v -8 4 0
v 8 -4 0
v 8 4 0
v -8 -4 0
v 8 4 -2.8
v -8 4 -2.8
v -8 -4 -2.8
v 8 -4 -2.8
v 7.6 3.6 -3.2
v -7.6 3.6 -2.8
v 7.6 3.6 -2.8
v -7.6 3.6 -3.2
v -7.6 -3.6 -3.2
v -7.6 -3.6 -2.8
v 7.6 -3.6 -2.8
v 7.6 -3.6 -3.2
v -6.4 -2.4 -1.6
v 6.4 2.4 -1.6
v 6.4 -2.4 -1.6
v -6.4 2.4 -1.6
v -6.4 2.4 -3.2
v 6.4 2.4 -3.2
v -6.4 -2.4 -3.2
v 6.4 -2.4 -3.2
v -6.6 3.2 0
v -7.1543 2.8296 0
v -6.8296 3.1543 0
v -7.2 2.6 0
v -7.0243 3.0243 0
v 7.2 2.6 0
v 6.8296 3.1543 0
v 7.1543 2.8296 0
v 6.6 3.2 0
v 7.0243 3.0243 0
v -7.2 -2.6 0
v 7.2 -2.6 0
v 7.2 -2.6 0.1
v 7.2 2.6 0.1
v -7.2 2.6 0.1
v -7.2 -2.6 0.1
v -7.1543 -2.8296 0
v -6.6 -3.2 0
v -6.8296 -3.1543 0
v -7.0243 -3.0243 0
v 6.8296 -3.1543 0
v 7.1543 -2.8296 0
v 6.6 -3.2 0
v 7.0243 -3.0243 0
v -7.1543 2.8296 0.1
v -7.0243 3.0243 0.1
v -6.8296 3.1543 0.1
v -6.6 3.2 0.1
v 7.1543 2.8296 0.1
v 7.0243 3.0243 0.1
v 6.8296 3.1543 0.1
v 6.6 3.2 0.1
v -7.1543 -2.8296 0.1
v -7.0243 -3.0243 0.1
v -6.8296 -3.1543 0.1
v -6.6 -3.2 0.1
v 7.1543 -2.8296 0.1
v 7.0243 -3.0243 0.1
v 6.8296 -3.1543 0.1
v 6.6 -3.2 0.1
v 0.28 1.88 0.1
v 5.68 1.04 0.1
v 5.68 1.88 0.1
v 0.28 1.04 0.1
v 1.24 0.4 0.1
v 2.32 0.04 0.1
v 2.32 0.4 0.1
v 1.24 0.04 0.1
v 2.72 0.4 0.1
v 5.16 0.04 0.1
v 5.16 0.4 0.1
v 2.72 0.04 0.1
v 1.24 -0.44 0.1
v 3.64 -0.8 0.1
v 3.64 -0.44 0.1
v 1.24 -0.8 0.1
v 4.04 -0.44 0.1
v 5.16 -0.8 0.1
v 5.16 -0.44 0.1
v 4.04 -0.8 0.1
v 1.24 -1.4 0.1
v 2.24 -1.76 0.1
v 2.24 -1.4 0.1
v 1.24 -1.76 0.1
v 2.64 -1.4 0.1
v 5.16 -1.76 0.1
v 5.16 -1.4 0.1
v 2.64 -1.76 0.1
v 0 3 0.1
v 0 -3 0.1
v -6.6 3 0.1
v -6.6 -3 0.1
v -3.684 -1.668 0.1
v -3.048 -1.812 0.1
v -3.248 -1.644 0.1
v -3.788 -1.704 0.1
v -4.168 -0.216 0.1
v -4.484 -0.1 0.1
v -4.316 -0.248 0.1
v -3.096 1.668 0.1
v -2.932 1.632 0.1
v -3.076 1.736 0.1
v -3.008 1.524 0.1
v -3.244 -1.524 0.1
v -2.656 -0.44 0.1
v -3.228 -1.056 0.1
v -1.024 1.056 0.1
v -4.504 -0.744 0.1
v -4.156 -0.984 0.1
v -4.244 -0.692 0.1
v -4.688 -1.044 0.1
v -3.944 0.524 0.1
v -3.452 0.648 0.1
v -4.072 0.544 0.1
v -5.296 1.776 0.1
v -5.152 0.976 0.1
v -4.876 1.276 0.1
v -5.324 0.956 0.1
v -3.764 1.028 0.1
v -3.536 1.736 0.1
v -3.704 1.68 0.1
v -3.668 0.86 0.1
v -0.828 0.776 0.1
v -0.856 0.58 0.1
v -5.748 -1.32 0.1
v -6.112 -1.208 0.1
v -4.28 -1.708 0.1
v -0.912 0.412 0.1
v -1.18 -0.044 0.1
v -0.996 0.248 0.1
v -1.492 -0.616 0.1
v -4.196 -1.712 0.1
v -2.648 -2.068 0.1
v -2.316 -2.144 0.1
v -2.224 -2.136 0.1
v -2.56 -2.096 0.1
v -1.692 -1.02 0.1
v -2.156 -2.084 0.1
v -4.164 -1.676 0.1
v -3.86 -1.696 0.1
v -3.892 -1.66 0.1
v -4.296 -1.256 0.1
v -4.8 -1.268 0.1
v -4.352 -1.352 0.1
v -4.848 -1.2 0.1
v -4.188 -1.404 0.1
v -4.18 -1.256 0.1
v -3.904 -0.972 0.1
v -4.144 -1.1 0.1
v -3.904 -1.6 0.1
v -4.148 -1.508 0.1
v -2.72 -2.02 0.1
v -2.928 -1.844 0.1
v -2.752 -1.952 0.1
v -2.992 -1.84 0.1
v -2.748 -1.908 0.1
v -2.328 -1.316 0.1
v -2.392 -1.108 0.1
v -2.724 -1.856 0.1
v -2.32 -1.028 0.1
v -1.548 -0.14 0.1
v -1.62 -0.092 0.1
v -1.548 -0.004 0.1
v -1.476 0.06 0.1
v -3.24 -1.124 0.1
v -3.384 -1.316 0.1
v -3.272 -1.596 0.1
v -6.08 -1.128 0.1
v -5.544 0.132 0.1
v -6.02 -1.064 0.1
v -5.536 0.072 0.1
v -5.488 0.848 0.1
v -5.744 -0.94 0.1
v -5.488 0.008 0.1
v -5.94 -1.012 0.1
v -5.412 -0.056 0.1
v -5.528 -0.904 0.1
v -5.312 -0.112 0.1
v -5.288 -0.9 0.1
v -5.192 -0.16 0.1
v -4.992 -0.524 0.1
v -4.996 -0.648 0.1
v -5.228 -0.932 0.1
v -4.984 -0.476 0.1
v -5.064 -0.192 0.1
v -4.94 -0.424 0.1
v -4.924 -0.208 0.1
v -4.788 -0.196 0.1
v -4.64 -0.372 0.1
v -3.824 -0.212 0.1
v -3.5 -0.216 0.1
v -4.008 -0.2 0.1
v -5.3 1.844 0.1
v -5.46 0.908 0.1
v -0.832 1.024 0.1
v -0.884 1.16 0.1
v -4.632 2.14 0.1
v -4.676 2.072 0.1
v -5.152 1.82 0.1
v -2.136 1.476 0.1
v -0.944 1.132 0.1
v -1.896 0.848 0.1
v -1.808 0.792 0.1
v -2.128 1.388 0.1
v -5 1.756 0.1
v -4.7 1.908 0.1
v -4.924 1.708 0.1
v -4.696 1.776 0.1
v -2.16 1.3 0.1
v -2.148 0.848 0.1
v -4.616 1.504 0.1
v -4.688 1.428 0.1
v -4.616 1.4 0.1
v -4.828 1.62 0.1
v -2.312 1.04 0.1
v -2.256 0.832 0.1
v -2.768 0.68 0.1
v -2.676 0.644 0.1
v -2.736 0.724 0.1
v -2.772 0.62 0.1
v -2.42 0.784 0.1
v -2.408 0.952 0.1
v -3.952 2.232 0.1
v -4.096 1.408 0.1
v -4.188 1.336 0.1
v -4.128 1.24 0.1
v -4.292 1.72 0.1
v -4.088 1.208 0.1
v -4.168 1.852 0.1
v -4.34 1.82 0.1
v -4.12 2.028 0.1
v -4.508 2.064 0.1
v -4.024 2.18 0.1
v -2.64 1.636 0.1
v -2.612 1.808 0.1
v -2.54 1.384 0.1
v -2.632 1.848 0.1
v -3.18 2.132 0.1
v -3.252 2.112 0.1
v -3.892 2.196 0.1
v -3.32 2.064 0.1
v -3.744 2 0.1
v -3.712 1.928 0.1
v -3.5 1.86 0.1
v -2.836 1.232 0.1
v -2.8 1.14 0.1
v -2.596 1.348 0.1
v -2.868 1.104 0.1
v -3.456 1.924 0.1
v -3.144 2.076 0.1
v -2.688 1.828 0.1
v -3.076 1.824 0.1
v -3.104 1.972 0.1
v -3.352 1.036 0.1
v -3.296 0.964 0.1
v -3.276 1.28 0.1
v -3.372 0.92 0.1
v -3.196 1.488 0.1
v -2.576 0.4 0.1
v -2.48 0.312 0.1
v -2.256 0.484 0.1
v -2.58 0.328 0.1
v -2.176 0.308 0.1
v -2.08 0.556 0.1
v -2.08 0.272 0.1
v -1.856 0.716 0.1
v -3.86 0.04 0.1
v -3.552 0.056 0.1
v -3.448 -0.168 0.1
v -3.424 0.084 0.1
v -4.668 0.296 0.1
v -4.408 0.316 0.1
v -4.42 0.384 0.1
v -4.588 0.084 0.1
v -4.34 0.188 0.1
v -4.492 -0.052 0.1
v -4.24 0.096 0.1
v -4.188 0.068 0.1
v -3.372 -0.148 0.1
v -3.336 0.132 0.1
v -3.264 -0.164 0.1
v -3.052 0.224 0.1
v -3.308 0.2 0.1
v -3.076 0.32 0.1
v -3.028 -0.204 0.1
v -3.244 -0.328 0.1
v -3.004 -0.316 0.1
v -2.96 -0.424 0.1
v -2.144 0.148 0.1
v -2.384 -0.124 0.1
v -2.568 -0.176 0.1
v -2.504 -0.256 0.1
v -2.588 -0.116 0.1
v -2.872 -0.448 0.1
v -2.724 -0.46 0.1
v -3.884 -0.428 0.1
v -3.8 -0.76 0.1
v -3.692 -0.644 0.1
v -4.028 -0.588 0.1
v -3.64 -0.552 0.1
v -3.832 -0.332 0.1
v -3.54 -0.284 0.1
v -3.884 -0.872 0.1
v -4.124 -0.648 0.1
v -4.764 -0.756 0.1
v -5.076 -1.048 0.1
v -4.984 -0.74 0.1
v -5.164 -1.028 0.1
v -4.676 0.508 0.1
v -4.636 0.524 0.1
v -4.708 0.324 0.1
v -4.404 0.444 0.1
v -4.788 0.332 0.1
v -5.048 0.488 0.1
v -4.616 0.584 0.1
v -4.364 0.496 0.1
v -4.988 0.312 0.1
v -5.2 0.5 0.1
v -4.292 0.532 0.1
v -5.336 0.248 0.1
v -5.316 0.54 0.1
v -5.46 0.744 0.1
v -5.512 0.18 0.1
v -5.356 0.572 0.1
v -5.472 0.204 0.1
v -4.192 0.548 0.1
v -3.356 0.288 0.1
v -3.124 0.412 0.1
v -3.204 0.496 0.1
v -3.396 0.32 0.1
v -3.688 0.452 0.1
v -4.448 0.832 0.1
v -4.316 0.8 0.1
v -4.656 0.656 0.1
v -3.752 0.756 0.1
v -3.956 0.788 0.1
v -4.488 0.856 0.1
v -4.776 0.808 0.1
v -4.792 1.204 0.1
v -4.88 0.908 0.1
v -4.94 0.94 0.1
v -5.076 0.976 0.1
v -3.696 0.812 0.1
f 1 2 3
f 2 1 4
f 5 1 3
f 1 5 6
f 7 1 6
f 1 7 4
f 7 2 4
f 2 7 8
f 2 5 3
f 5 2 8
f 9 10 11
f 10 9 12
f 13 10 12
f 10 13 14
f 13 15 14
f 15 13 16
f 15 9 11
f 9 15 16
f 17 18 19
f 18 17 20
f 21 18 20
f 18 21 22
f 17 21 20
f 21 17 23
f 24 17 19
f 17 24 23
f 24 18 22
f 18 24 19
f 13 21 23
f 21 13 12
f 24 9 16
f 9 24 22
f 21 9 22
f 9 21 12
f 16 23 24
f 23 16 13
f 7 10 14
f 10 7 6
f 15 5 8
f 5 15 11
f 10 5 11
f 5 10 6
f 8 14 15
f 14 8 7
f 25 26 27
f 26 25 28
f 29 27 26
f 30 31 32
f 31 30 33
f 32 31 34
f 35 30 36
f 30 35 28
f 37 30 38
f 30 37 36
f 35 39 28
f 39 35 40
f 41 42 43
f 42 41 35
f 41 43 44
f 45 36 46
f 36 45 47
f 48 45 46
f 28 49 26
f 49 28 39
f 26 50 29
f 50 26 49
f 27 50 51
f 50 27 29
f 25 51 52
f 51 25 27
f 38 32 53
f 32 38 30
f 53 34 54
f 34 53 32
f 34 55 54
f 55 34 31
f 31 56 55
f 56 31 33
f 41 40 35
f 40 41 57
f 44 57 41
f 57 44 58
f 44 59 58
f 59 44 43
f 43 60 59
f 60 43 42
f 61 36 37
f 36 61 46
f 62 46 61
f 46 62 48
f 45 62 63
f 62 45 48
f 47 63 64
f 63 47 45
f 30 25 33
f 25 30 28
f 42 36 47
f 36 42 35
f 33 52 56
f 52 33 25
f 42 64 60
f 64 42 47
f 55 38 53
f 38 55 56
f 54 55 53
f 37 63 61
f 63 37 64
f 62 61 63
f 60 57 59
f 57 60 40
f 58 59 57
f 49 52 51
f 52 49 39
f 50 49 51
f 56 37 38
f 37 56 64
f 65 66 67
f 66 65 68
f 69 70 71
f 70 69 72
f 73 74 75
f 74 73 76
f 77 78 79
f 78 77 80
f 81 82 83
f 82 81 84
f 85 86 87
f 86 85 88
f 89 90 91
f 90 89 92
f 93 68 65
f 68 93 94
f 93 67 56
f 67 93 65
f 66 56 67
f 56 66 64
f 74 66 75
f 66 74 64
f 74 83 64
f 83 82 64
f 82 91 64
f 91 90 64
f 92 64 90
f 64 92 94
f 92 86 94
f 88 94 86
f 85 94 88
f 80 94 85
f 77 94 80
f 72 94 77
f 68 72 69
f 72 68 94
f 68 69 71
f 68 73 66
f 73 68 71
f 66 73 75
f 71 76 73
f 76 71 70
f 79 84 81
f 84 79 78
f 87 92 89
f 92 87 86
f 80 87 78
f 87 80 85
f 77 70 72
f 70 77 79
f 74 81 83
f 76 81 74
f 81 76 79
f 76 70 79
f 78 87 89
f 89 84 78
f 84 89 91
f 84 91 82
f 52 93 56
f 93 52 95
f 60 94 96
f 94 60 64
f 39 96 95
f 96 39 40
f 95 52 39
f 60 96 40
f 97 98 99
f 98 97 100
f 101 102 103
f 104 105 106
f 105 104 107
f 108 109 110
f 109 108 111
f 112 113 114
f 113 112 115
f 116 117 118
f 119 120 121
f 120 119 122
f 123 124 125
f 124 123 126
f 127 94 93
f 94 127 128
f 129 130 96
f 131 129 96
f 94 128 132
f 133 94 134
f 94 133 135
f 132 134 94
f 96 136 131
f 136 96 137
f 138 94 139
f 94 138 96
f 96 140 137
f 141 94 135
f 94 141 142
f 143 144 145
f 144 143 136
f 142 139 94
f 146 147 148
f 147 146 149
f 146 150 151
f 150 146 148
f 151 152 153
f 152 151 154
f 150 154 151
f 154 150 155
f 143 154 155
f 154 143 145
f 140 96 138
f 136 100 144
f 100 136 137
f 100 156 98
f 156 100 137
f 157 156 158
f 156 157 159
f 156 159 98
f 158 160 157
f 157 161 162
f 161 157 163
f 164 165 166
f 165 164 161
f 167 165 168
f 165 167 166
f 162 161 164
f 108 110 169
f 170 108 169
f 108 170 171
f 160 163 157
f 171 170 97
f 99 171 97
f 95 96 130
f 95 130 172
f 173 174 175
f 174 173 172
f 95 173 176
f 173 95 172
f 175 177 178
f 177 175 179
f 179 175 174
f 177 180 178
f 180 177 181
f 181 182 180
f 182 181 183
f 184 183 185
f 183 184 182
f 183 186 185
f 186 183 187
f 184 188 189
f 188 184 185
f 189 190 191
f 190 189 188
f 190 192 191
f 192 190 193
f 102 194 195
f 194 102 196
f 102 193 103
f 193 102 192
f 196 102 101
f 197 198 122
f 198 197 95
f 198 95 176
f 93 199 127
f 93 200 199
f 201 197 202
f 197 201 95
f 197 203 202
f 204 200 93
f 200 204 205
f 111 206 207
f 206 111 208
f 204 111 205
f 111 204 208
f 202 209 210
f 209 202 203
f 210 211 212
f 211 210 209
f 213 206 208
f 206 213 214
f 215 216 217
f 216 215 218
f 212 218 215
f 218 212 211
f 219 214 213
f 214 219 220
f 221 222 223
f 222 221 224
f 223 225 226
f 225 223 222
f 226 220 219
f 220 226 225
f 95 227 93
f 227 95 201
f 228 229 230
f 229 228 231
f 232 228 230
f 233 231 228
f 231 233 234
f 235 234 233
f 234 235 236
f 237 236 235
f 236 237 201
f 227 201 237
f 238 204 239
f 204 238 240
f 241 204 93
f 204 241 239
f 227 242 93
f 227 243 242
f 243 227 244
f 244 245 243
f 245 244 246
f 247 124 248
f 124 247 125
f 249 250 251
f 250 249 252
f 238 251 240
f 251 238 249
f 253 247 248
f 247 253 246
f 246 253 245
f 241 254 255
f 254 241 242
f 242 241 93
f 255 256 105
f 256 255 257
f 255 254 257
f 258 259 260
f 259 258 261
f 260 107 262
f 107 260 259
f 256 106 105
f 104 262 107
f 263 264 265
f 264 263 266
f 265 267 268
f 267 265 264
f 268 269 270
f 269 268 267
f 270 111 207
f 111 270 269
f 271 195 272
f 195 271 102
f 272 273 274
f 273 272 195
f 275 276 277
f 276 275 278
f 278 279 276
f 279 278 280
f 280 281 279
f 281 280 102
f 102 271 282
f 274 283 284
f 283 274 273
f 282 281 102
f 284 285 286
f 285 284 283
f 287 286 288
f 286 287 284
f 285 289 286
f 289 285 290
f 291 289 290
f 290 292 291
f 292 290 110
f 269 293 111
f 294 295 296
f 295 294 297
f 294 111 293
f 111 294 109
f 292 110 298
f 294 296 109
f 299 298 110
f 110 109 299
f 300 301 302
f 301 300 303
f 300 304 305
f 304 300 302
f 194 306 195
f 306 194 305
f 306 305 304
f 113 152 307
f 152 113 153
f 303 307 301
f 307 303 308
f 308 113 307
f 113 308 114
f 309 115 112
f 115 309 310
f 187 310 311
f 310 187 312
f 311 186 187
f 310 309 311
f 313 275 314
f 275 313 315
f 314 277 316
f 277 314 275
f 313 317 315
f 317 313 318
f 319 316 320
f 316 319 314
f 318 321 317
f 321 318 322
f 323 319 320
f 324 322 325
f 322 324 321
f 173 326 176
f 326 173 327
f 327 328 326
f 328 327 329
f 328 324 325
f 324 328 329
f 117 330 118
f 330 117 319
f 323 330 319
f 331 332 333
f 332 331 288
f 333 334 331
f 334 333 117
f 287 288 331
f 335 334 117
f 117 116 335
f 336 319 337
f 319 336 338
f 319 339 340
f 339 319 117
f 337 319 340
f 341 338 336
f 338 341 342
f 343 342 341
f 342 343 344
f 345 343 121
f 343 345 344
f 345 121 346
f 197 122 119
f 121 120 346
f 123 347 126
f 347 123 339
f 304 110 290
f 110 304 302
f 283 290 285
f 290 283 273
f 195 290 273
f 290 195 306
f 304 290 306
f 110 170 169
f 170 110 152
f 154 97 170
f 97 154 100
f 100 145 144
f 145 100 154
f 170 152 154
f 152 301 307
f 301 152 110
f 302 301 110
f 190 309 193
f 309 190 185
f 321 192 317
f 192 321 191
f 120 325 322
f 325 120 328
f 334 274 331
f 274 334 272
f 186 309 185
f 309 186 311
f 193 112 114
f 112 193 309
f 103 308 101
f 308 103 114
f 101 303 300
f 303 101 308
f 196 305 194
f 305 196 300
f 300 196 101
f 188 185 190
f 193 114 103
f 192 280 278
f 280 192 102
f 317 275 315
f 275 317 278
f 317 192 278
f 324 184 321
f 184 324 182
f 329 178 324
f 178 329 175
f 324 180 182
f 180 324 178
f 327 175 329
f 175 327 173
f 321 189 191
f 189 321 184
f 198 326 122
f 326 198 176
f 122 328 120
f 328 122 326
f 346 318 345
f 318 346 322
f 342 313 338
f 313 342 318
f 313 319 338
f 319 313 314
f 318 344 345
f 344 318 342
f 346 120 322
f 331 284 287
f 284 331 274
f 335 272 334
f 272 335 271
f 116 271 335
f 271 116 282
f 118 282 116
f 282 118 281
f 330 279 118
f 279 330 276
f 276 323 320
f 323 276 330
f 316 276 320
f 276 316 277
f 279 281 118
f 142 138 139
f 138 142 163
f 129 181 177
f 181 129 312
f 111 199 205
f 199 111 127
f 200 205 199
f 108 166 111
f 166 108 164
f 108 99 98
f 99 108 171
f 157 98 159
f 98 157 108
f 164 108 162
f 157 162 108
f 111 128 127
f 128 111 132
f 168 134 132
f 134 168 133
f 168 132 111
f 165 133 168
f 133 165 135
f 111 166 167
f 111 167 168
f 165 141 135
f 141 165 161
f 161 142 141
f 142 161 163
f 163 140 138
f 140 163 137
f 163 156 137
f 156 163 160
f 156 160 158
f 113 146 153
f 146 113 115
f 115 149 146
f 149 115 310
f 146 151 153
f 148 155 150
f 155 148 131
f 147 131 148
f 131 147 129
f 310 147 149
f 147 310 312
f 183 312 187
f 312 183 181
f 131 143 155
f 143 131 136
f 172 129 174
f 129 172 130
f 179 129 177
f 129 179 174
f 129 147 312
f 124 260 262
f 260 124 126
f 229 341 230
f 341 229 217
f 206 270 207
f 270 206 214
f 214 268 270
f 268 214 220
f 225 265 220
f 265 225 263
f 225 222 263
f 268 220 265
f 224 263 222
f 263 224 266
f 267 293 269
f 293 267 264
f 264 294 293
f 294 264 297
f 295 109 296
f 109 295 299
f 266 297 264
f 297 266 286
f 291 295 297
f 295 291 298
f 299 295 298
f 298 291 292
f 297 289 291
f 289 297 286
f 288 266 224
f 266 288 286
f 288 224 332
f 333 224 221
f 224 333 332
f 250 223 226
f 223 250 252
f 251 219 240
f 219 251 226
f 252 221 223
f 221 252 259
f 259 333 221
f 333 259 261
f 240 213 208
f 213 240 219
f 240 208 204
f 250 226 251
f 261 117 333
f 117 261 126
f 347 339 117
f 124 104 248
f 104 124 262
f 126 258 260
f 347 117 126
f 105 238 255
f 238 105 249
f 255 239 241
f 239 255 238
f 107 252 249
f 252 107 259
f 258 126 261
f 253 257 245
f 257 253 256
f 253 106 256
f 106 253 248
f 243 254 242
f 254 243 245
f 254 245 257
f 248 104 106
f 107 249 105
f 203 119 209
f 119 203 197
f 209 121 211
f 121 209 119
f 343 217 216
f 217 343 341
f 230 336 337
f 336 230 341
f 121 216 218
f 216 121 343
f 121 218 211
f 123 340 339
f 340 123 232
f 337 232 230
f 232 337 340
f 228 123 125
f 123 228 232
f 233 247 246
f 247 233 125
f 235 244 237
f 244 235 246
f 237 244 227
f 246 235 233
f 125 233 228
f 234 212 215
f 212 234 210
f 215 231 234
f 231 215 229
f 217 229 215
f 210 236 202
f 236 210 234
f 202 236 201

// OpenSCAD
use <../lib.scad>
use <3069b.scad>
use <6435269d.scad>
function ldraw_lib__3069bd1b() = [
// 0 Tile  1 x  2 with Strelitzia Reginae Sign Sticker
// 0 Name: 3069bd1b.dat
// 0 Author: Philippe Hurbain [Philo]
// 0 !LDRAW_ORG Shortcut UPDATE 2025-08
// 0 !LICENSE Licensed under CC BY 4.0 : see CAreadme.txt
// 
// 0 BFC CERTIFY CCW
  [0,"BFC","CERTIFY"],
  [0,"BFC","CCW"],
// 
// 0 !CATEGORY Sticker Shortcut
// 0 !KEYWORDS Bricklink 41757stk01, Rebrickable 10109627, Set 41757
// 
// 0 !HISTORY 2025-08-31 [OrionP] Official Update 2025-08
// 
// 1 16 0 0 0 1 0 0 0 1 0 0 0 1 3069b.dat
  [1,16,0,0,0,1,0,0,0,1,0,0,0,1, ldraw_lib__3069b()],
// 1 16 0 0 0 1 0 0 0 1 0 0 0 1 6435269d.dat
  [1,16,0,0,0,1,0,0,0,1,0,0,0,1, ldraw_lib__6435269d()],
];
module ldraw_lib__3069bd1b(step=0, col=false, unit=2/5, alt=false, line=0.2, solid=!$preview)
    makepoly(ldraw_lib__3069bd1b(), step=step, col=col, unit=unit, alt=alt, line=line, solid=solid);
ldraw_lib__3069bd1b(line=0.2);
